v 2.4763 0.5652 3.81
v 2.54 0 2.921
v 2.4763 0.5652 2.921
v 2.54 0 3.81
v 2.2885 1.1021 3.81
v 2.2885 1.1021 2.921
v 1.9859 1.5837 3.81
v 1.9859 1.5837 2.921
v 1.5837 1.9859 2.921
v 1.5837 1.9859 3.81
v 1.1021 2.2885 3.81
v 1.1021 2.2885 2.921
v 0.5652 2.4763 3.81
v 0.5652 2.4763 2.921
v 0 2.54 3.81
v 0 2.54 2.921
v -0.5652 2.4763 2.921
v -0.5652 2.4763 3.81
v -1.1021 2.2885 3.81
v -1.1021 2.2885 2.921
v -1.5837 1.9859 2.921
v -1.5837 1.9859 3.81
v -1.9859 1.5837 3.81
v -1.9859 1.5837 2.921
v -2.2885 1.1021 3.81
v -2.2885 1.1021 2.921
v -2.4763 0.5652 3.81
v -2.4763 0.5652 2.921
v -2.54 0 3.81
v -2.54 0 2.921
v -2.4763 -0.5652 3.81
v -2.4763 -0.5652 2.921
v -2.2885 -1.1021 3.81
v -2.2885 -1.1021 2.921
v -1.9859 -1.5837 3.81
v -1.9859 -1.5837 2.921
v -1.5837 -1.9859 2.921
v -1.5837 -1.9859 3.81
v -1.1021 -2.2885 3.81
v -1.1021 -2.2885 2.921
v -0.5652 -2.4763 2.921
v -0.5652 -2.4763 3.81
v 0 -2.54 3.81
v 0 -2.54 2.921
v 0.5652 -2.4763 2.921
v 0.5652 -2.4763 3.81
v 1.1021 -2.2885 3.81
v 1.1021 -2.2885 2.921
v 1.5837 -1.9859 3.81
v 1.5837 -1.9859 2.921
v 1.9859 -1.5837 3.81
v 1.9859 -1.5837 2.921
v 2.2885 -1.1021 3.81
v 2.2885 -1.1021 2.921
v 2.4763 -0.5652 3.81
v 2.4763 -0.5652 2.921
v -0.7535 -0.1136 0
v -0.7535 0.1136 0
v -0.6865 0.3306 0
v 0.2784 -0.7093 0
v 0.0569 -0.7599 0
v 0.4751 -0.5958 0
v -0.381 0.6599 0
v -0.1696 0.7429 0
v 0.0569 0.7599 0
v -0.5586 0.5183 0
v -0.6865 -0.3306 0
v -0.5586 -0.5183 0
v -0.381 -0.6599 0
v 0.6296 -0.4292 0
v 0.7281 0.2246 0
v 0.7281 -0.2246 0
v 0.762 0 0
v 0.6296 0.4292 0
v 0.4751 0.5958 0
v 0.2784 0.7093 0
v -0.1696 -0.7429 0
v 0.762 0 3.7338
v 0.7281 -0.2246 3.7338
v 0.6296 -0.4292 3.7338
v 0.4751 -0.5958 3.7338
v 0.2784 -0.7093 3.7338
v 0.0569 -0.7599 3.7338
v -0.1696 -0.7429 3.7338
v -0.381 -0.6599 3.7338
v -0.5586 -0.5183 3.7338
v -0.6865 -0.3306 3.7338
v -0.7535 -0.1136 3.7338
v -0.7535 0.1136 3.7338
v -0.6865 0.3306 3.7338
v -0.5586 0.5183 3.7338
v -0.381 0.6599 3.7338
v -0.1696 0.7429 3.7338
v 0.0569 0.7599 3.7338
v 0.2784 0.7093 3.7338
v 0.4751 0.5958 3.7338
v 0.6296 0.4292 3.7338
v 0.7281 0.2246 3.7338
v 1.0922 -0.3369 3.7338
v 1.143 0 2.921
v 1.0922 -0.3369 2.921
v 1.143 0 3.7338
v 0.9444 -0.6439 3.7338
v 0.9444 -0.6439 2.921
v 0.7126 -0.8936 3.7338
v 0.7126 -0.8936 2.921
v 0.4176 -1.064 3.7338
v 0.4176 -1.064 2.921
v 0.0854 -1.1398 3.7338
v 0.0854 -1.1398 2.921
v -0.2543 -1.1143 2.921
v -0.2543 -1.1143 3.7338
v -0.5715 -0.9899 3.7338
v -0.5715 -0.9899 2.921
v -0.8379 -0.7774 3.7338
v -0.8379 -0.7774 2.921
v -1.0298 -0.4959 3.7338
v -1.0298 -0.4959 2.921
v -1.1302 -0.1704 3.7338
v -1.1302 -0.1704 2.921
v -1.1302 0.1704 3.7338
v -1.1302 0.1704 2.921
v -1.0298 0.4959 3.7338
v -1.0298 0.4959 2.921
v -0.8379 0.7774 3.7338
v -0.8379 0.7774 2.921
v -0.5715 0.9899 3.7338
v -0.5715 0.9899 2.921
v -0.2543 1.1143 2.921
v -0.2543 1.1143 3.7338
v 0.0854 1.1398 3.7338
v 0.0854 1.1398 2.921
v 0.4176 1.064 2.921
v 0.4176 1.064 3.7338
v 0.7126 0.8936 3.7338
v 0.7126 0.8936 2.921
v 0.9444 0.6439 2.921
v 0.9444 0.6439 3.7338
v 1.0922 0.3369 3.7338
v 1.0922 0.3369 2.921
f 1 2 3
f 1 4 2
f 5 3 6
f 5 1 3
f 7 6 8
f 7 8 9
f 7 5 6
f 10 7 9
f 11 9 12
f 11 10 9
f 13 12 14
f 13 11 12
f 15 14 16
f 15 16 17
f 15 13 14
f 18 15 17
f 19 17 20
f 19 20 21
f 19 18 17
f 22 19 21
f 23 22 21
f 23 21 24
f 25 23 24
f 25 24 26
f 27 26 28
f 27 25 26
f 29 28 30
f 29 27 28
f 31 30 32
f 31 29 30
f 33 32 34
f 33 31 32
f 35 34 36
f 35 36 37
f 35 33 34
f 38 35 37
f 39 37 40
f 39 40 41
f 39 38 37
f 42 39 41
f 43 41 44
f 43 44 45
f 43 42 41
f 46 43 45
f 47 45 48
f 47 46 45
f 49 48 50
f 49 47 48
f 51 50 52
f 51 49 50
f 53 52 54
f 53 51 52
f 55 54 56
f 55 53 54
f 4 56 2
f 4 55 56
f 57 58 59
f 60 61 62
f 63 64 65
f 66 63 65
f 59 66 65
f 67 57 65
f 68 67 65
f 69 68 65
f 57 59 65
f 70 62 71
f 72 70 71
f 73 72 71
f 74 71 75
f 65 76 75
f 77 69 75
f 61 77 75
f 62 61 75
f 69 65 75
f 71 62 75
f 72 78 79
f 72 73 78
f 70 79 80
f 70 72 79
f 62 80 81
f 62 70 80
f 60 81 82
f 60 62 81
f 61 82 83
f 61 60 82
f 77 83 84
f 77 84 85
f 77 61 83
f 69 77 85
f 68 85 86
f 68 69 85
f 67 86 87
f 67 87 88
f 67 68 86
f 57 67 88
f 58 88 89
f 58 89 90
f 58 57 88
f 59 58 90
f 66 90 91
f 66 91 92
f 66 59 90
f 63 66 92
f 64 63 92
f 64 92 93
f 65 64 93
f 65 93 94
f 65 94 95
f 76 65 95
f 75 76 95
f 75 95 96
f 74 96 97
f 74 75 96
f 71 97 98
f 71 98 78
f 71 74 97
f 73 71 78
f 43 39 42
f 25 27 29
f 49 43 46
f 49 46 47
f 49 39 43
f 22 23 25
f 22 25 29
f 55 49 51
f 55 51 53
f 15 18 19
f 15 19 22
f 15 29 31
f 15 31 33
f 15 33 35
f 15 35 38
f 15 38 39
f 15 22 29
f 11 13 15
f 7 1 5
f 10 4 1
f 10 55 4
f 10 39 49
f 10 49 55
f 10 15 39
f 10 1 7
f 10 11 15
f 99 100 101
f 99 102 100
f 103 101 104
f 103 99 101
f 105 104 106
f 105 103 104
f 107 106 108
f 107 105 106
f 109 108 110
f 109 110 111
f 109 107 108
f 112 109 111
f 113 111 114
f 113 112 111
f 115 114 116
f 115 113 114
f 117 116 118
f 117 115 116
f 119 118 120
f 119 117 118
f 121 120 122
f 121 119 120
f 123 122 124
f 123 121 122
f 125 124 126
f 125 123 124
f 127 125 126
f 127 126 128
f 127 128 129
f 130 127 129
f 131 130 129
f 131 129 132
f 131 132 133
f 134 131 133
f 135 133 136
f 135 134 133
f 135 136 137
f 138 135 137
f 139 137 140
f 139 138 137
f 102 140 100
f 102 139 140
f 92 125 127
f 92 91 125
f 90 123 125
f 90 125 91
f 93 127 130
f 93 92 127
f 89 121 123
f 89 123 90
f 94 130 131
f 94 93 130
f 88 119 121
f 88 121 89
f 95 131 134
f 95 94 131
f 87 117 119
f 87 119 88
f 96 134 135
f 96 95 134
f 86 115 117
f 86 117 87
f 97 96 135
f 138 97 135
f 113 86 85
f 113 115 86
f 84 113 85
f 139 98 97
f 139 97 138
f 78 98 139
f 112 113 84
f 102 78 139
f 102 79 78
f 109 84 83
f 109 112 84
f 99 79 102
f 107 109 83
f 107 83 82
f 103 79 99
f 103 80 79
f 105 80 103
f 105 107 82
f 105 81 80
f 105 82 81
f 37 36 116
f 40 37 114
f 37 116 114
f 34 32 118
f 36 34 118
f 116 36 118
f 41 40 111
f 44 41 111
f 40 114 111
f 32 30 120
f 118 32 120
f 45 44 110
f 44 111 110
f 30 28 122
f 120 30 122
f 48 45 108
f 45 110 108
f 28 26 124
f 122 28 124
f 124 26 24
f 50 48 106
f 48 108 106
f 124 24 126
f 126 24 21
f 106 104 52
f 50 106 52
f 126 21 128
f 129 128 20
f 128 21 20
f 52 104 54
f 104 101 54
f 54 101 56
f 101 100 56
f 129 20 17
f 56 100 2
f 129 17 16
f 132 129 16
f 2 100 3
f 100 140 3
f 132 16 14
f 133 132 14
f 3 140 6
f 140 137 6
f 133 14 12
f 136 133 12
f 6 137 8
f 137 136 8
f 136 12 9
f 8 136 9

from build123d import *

# Parameters (mm, degrees)
F0_R     = 0.762
F1_DEPTH = 3.81
F2_R     = 2.54
F3_DEPTH = 0.635
F4_R     = 1.143
F4_R_2   = 0.762
F5_DEPTH = 0.5588
F6_DEPTH = 0.254


with BuildPart() as f1:
    # F0 (on Top) → F1 (new body)
    with BuildSketch(Plane.XY):
        Circle(F0_R)
    extrude(amount=F1_DEPTH)

    # F2 (on face) → F3 (join)
    with BuildSketch(Plane.XY.offset(3.81)):
        Circle(F2_R)
    extrude(amount=-F3_DEPTH)

    # F4 (on face) → F5 (cut)
    with BuildSketch(Plane(origin=(0, 0, 3.175), x_dir=(1, 0, 0), z_dir=(0, 0, -1))):
        Circle(F4_R)
        Circle(F4_R_2, mode=Mode.SUBTRACT)
    extrude(amount=-F5_DEPTH, mode=Mode.SUBTRACT)

    # F6 (add): a face of the model
    f6_faces = [f1.faces().sort_by_distance(p)[0] for p in [
        (-2.468157951, 0, 3.175),
    ]]
    extrude(f6_faces, amount=F6_DEPTH)


solid = f1.part
